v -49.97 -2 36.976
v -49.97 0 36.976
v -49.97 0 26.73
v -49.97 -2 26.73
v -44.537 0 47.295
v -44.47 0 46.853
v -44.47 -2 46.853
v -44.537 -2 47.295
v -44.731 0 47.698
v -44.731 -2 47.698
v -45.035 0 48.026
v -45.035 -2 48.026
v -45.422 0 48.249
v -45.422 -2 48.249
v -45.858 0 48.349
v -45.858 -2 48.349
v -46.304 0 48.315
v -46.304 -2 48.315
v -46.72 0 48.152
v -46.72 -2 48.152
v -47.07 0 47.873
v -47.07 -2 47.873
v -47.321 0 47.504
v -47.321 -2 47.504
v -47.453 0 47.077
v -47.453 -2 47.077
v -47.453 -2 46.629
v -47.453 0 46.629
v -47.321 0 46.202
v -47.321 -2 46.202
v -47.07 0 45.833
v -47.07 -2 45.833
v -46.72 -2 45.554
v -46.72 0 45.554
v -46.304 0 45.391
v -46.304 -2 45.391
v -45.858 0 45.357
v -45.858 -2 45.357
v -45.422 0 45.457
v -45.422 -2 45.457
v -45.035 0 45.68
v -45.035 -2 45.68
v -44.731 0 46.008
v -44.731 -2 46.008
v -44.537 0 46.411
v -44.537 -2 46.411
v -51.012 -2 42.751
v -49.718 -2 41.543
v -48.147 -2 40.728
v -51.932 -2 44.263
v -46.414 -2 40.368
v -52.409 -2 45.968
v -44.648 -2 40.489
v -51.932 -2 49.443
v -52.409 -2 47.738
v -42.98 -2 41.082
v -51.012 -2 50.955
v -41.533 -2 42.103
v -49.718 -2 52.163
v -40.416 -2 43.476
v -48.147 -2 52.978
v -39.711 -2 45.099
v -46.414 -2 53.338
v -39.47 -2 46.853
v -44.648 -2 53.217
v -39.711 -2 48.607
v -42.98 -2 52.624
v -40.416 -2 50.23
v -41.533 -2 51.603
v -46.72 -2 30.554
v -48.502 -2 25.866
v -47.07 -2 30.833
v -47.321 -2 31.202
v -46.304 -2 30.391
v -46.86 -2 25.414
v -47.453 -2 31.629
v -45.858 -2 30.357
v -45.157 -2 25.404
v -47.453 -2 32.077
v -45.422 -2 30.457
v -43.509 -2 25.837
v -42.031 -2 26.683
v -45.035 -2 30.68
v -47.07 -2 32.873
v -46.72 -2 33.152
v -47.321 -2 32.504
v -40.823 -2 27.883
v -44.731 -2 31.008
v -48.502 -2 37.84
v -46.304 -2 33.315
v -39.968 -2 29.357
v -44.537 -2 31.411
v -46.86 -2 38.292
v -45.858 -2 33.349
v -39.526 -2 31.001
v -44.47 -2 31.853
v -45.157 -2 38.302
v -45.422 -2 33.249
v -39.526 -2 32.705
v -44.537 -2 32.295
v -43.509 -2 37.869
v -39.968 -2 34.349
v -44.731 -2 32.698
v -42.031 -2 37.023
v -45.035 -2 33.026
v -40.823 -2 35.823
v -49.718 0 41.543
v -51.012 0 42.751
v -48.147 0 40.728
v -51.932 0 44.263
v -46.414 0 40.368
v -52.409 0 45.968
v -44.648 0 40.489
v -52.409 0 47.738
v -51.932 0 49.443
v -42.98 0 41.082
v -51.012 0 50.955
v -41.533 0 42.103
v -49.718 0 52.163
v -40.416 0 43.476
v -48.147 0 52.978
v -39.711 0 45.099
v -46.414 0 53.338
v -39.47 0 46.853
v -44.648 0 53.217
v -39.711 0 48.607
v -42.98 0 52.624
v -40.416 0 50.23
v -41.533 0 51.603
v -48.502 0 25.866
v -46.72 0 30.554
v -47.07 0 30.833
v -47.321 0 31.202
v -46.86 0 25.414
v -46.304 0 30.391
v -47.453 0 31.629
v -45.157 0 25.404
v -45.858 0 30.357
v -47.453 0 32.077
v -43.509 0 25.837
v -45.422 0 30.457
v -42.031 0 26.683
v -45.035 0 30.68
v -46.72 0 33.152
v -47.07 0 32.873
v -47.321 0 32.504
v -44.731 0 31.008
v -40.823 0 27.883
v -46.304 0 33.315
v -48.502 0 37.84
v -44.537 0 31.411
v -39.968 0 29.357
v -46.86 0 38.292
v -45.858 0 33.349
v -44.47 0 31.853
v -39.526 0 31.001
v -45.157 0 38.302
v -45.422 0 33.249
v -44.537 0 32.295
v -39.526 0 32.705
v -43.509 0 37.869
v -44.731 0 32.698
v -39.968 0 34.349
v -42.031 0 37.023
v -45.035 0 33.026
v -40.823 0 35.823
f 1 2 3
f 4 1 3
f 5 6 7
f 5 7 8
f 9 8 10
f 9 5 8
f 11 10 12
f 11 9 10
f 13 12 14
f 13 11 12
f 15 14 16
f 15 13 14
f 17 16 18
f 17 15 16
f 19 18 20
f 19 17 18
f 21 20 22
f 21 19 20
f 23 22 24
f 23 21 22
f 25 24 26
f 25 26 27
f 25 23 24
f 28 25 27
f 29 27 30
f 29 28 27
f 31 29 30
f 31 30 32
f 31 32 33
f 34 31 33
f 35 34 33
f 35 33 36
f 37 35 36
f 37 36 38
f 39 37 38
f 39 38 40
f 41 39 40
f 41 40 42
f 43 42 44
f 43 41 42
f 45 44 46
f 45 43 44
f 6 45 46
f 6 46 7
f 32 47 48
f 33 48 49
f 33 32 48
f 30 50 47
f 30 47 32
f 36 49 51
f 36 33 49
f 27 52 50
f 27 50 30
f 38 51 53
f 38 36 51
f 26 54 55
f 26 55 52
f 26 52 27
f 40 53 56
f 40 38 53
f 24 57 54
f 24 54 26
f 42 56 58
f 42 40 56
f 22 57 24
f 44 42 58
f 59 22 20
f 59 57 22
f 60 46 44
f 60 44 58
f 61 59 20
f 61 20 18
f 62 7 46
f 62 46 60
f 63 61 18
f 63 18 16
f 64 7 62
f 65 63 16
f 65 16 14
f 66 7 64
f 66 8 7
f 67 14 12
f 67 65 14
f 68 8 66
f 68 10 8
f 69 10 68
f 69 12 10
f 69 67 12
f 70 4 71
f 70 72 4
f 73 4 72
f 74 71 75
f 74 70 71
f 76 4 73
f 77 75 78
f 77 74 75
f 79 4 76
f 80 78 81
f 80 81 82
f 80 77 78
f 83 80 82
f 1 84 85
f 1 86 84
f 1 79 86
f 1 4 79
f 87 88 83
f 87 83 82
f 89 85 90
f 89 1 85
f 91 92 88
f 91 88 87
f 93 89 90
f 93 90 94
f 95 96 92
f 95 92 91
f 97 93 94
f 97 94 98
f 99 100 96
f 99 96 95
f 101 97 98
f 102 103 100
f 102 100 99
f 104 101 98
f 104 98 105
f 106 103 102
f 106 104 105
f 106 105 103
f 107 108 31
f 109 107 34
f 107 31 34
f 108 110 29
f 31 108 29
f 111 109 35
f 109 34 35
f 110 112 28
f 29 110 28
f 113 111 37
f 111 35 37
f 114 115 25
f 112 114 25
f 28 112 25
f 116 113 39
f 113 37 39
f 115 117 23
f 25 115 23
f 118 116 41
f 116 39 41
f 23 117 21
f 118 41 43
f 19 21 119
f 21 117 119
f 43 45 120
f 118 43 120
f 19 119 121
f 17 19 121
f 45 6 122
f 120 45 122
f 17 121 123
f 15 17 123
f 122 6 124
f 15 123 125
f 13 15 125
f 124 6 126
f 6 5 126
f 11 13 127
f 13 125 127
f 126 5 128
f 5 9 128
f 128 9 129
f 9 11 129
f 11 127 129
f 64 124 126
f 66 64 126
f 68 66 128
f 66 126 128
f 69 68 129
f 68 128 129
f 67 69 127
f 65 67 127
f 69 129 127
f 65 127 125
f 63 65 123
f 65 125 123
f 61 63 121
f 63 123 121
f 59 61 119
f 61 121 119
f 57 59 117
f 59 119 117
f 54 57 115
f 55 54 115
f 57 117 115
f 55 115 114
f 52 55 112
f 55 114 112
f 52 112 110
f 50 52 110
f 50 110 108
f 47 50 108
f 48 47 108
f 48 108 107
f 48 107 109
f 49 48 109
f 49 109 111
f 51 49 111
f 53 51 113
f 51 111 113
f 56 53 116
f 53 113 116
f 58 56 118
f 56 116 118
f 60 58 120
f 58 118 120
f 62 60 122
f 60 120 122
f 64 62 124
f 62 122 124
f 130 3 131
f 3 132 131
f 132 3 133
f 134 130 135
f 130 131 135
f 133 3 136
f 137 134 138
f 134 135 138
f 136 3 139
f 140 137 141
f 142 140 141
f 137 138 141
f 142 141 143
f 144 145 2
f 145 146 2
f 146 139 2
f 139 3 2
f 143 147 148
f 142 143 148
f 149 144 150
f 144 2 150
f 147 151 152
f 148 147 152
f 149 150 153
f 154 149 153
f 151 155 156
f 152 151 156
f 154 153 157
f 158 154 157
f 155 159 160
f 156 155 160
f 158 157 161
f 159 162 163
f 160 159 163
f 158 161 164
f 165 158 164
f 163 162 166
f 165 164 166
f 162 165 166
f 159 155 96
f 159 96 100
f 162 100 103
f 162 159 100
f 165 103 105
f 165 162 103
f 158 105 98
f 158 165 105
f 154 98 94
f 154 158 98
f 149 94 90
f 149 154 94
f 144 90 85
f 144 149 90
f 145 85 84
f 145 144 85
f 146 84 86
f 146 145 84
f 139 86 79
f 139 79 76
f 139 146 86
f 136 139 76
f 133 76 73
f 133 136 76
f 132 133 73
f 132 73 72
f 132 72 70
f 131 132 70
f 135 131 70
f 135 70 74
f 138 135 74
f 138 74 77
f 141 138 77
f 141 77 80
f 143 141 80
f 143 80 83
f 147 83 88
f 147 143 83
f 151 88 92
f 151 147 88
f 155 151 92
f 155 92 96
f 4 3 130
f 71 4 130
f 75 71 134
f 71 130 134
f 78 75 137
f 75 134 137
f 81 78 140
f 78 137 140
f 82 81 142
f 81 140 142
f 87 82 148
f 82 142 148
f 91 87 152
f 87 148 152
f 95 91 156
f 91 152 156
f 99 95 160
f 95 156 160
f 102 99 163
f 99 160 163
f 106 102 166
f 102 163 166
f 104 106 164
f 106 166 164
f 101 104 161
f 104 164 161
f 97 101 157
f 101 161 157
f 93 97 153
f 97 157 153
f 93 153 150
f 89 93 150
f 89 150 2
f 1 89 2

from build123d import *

# Parameters (mm, degrees)
F0_R     = 6.5
F0_R_2   = 1.5
F1_DEPTH = 2


with BuildPart() as f1:
    # F0 (on Front) → F1 (new body)
    with BuildSketch(Plane.XZ):
        with Locations((-45.970005, 46.853024)):
            Circle(F0_R)
        with Locations((-45.970005, 46.853024)):
            Circle(F0_R_2, mode=Mode.SUBTRACT)
        with BuildLine():
            Line((-49.970005, 36.976499), (-49.970005, 26.729549))
            ThreePointArc((-49.970005, 26.729549), (-39.470005, 31.853024), (-49.970005, 36.976499))
        make_face()
        with Locations((-45.970005, 31.853024)):
            Circle(F0_R_2, mode=Mode.SUBTRACT)
    extrude(amount=F1_DEPTH)


solid = f1.part
